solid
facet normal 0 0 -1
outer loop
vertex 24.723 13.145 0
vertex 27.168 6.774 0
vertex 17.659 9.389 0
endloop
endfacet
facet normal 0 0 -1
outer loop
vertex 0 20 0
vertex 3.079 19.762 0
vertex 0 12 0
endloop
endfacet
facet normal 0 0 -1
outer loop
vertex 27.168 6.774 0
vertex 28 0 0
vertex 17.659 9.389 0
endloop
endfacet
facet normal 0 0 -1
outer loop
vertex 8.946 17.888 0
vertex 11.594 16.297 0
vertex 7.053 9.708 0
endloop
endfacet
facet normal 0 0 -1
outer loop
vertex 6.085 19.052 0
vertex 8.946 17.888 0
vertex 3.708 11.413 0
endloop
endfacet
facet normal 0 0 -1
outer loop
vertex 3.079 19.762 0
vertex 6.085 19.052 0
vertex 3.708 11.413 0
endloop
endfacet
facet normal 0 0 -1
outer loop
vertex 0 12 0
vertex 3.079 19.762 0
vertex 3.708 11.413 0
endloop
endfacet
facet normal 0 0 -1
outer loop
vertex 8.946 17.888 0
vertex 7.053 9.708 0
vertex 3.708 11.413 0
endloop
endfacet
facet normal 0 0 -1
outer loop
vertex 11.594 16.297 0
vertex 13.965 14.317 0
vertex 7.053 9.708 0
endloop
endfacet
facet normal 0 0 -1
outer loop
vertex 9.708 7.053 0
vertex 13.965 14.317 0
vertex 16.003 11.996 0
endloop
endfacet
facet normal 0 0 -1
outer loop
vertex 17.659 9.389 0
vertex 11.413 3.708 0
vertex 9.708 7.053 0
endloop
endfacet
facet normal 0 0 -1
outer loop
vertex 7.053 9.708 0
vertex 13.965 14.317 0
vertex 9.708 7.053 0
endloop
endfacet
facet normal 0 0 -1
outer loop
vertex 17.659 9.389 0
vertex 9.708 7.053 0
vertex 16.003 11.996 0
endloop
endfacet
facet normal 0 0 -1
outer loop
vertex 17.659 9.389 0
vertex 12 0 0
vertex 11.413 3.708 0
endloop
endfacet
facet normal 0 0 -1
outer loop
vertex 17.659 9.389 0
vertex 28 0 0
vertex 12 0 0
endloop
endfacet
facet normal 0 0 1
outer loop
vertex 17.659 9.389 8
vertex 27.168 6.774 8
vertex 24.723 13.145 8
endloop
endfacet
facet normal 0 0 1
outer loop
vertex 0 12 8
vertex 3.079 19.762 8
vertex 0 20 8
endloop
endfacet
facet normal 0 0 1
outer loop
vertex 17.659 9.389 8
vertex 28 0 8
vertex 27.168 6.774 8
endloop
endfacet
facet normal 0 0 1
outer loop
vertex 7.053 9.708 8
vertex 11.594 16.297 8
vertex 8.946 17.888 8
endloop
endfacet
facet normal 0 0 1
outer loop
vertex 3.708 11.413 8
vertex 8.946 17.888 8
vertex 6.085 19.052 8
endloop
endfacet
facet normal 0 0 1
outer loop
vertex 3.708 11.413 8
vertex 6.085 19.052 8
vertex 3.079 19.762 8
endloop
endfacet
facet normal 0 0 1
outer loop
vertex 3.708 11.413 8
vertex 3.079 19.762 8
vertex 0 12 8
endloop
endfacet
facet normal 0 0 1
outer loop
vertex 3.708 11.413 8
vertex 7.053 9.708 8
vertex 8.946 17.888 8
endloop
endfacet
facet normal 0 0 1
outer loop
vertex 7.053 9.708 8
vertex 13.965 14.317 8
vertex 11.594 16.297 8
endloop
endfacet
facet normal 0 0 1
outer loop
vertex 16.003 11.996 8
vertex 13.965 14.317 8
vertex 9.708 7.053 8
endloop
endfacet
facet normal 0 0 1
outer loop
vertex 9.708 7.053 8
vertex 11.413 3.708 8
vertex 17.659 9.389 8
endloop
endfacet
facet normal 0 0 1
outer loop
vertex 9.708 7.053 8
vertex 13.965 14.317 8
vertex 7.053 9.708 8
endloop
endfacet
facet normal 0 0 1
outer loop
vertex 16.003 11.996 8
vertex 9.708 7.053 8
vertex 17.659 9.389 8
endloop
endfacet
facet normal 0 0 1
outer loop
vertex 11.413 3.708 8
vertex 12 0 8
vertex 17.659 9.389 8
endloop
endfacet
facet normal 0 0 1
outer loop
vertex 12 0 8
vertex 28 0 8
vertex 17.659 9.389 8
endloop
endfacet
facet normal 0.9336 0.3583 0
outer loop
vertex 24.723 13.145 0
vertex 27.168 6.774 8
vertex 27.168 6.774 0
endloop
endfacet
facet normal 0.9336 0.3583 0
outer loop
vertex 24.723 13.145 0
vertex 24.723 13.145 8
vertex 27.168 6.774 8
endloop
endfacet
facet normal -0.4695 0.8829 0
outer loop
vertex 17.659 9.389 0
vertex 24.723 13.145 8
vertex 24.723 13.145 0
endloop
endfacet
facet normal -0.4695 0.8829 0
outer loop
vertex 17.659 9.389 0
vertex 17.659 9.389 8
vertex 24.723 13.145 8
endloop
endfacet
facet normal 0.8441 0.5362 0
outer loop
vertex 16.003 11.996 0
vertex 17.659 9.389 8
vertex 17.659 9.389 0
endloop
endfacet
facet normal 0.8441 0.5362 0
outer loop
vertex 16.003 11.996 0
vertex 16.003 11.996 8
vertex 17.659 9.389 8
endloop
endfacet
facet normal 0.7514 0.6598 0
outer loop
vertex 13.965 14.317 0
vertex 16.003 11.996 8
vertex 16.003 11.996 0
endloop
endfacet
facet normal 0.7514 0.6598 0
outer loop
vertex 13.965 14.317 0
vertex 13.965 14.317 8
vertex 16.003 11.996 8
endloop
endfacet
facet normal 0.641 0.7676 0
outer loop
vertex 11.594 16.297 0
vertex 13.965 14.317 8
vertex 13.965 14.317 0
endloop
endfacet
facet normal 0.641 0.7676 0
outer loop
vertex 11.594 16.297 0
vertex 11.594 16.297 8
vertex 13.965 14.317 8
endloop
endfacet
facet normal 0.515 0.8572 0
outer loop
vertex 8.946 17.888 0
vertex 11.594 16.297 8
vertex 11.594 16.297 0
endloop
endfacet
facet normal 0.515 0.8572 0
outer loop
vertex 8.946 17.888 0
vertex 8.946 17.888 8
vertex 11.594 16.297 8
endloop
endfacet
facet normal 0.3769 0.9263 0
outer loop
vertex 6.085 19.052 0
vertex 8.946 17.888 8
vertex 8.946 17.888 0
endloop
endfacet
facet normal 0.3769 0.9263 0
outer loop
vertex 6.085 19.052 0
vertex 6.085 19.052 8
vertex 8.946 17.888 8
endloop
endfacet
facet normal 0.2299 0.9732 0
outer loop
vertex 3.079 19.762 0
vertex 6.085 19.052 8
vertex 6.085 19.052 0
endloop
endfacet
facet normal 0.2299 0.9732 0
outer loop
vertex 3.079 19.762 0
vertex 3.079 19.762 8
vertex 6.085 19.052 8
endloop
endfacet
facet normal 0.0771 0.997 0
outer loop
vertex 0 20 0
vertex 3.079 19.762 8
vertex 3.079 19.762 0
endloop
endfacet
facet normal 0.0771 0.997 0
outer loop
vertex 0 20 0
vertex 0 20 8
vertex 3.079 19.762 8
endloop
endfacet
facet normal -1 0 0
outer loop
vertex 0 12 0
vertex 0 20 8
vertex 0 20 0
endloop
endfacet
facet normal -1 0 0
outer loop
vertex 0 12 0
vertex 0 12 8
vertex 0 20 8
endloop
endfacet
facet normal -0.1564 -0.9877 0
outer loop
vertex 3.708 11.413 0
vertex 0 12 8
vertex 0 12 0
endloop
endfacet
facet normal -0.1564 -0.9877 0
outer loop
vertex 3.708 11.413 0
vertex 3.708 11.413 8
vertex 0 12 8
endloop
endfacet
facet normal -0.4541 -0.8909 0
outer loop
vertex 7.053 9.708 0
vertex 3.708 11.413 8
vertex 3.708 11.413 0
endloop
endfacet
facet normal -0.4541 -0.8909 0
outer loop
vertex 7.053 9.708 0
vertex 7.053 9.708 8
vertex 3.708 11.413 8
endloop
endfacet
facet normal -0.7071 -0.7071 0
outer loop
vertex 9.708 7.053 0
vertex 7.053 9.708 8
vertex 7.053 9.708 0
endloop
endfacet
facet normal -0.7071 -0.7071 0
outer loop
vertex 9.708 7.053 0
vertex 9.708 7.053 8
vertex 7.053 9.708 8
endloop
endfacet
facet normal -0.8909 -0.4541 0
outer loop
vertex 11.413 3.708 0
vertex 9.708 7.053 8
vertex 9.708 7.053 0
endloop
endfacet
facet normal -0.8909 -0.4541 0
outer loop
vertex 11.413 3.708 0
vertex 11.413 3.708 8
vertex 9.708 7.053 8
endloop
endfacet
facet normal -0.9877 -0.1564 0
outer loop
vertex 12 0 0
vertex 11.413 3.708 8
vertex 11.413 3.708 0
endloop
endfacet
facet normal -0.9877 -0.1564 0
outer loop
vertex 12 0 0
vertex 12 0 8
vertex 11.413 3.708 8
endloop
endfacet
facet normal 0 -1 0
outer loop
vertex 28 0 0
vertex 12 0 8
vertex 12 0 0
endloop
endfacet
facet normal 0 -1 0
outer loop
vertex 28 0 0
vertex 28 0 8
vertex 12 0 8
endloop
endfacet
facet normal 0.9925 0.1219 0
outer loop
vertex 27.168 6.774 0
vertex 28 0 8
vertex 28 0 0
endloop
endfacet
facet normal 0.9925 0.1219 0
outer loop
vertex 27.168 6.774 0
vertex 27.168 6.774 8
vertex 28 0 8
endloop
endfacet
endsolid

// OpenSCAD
$fn = 32;

// ----------------------------------------------------------------------
// Arc stop: segment, 8 mm thick
// ----------------------------------------------------------------------

// --- parameters (mm) ---
profile_height = 8;       // extrusion height
profile_points = 17;      // points of the closed outline

profile = [[28, 0], [27.168, 6.774], [24.723, 13.145], [17.659, 9.389], [16.003, 11.996], [13.965, 14.317], [11.594, 16.297], [8.946, 17.888], [6.085, 19.052], [3.079, 19.762], [0, 20], [0, 12], [3.708, 11.413], [7.053, 9.708], [9.708, 7.053], [11.413, 3.708], [12, 0]];  // single closed polygon, 17 points, counter clockwise

// --- the one profile operation ---
linear_extrude(height = profile_height) polygon(points = profile);
